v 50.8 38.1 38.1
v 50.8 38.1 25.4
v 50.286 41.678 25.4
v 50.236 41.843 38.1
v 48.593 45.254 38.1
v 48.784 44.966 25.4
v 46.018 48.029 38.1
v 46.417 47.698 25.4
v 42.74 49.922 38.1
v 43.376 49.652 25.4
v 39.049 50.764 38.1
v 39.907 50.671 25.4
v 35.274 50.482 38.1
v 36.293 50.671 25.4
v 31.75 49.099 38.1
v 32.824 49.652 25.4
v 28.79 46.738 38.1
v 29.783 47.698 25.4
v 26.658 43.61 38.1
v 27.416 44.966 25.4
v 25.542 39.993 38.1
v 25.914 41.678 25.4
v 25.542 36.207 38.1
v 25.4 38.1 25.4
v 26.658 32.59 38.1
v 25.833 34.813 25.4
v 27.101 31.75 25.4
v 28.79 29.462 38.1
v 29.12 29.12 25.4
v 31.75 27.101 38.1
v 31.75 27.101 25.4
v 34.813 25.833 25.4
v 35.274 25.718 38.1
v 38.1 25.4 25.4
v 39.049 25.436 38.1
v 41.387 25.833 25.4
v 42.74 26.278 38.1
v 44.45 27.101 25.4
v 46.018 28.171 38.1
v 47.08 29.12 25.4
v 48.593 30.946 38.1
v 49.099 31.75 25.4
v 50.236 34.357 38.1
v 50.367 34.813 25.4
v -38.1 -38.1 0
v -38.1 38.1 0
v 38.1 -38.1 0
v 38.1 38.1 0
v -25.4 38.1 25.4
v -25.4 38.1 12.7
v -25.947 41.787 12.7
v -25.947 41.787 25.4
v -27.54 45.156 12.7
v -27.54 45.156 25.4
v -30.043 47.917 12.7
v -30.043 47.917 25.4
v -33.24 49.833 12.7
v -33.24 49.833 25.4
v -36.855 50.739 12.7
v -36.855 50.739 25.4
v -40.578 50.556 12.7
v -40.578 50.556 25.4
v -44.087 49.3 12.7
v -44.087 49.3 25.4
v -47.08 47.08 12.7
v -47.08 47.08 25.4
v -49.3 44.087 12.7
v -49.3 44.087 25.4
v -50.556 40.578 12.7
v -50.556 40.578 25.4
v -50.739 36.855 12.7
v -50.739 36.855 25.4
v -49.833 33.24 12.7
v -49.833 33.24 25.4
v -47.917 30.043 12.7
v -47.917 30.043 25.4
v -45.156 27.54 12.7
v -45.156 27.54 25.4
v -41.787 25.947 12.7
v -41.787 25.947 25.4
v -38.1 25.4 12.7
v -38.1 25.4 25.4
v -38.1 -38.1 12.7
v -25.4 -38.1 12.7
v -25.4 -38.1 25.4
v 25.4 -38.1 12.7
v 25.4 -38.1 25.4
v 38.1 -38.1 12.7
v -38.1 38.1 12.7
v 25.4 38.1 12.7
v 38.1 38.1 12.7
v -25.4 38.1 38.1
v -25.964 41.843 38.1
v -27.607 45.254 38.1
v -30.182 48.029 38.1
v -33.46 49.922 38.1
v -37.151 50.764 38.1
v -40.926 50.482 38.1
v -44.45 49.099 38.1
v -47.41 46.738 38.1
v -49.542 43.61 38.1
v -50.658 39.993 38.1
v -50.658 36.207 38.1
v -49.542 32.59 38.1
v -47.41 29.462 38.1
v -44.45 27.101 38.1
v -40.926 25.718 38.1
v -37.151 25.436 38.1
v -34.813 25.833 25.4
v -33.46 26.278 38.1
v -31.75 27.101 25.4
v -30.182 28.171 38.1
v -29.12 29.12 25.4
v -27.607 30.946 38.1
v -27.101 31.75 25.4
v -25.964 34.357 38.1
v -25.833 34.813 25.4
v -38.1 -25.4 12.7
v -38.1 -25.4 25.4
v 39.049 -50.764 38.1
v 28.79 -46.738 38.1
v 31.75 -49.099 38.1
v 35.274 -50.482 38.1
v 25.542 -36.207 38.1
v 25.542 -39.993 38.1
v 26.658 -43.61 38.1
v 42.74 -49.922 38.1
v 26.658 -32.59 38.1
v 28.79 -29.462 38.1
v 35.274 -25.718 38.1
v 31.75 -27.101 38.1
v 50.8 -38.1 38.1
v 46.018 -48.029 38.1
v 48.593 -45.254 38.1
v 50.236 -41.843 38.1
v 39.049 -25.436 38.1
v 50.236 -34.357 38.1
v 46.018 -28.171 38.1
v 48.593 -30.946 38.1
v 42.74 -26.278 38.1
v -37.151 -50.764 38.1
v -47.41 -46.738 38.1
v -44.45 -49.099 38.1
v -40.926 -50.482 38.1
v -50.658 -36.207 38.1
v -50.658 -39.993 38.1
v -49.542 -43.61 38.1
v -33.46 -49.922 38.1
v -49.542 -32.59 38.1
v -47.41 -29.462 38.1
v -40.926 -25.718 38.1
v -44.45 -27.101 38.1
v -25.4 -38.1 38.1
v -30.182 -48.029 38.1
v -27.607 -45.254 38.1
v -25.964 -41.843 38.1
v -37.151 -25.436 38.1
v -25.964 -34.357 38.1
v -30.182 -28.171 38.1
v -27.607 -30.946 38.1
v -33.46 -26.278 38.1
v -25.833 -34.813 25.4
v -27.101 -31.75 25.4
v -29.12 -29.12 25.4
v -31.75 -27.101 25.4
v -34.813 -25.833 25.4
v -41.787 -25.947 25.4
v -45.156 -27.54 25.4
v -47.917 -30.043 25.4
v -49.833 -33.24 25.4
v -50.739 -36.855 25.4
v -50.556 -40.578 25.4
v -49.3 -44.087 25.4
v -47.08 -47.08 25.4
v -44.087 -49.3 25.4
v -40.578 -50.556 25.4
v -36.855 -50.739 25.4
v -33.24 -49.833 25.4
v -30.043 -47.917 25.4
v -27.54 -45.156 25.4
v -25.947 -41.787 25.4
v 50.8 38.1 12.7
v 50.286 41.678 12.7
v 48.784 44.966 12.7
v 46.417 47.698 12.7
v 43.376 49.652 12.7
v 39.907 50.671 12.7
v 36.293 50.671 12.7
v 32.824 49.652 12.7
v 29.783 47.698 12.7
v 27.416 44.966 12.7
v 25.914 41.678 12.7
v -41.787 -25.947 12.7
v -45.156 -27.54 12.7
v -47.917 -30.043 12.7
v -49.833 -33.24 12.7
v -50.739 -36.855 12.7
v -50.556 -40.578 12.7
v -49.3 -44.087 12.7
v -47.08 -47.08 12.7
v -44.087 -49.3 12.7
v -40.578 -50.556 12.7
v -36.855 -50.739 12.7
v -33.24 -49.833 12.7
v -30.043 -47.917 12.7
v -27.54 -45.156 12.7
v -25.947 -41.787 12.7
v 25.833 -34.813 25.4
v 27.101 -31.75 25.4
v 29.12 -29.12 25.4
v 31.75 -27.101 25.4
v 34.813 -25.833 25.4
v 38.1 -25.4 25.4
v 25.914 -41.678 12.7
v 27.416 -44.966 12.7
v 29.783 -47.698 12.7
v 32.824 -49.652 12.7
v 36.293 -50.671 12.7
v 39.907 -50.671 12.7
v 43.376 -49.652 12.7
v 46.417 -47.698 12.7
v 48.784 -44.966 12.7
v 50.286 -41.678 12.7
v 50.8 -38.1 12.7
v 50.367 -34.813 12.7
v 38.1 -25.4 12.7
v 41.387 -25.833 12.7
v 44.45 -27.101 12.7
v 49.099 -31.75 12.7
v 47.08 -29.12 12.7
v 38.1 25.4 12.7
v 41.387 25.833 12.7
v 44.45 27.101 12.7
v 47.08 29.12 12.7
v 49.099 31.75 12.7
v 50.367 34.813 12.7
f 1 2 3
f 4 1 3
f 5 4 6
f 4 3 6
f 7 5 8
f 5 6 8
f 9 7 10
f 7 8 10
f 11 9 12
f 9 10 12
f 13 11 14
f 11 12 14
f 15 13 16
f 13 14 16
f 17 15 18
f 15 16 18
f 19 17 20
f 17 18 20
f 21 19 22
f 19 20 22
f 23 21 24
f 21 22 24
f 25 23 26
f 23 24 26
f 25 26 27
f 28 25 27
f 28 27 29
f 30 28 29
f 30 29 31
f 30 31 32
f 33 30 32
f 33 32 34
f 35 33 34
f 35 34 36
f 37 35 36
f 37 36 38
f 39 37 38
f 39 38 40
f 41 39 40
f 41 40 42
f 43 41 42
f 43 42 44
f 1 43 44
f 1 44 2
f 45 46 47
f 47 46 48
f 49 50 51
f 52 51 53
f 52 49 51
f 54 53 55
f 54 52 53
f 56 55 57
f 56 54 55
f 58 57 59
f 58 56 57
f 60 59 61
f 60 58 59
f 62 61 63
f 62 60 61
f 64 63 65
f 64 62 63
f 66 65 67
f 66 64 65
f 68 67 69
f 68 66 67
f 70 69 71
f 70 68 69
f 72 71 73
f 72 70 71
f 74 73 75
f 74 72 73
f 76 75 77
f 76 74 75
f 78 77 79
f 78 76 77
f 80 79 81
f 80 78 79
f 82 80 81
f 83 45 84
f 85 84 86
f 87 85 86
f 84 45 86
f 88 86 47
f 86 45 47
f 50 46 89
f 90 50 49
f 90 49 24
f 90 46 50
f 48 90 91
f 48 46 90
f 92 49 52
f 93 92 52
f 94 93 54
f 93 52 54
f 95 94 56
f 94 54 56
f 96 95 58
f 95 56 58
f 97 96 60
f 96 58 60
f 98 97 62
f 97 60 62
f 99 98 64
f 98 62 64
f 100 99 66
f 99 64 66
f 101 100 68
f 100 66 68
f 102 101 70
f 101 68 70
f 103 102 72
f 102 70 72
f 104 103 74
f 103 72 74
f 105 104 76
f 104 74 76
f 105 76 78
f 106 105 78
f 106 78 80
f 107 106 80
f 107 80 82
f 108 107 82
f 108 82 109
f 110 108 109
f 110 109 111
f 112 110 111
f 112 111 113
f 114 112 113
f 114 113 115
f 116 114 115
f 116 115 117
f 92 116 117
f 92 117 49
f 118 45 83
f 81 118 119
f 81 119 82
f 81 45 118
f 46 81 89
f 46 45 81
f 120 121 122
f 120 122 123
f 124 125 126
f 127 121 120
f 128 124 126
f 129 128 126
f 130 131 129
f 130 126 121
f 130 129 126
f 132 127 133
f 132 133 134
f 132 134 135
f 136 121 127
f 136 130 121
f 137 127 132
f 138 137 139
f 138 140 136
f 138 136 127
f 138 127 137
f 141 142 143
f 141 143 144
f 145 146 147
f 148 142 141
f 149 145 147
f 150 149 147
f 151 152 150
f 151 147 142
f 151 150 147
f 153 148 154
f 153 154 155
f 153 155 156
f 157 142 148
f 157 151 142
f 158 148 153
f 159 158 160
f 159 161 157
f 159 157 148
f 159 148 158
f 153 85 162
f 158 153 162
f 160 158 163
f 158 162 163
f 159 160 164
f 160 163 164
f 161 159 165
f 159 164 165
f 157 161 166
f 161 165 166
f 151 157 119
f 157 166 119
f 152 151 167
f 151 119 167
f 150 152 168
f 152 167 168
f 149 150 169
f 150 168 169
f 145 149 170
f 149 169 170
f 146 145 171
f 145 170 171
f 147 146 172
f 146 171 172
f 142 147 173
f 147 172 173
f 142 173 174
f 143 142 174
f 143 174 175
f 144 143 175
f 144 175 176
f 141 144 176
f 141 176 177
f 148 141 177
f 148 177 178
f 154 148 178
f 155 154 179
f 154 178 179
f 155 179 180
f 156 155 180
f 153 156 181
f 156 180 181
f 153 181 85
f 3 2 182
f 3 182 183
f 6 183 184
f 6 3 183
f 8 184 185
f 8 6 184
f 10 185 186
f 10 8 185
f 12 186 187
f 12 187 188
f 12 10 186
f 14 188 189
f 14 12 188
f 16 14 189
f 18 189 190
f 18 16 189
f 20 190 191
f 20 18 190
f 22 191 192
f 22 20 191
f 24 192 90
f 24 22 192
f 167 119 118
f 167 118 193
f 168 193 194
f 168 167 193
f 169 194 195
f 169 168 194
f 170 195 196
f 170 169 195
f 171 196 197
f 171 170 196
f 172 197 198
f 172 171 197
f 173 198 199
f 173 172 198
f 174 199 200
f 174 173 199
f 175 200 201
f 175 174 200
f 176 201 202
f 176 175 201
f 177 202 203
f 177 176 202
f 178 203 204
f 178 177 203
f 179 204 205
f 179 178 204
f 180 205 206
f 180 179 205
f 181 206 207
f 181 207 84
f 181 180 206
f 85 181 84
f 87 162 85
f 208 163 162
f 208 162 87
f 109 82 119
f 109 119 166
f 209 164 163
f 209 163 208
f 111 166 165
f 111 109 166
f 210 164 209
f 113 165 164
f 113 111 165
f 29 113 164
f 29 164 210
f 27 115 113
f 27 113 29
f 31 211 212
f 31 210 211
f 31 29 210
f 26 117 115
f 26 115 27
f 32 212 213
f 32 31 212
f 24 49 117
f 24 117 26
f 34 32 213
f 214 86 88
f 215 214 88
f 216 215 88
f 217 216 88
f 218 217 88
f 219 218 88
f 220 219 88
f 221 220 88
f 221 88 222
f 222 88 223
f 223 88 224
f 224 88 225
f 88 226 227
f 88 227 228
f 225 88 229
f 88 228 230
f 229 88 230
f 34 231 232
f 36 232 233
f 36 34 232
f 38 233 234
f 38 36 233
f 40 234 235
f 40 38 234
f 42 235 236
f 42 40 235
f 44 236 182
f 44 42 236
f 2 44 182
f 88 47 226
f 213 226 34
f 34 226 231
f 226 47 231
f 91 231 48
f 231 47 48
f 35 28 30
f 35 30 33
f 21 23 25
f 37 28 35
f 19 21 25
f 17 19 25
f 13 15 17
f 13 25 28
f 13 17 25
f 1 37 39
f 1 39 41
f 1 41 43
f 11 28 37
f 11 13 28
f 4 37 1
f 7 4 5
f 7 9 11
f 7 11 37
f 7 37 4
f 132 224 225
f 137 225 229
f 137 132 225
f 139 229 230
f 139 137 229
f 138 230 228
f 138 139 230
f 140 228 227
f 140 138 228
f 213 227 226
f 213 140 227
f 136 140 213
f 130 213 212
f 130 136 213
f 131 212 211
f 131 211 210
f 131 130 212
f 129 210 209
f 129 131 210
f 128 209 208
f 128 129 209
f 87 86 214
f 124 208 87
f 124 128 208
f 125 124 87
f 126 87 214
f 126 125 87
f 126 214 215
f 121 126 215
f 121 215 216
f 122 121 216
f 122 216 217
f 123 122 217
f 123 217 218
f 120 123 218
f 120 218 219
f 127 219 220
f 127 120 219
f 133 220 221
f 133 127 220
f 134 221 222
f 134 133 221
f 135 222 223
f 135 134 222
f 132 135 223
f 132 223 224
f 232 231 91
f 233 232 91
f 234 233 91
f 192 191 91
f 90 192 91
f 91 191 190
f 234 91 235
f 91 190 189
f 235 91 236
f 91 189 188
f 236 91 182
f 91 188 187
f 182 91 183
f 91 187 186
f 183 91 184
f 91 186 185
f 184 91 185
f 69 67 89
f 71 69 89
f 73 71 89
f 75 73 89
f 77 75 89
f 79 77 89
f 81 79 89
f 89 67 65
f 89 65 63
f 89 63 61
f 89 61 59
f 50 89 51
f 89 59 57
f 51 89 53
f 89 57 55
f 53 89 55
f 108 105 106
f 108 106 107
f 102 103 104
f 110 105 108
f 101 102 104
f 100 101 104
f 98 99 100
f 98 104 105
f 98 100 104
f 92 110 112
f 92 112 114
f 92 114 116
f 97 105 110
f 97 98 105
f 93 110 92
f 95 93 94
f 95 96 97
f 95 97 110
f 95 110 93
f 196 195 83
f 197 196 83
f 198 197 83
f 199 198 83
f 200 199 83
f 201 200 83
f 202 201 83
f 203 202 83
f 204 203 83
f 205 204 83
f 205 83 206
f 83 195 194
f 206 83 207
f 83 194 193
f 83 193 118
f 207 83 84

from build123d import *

# Parameters (mm, degrees)
F0_W     = 76.2
F0_H     = 76.2
F1_DEPTH = 25.4
F2_R     = 12.7
F3_DEPTH = 12.7


with BuildPart() as f1:
    # F0 (on Top) → F1 (new body)
    with BuildSketch(Plane.XY):
        Rectangle(F0_W, F0_H)
    extrude(amount=F1_DEPTH)

    # F2 (on face) → F3 (join, symmetric)
    with BuildSketch(Plane.XY.offset(25.4)):
        with Locations((-38.1, 38.1)):
            Circle(F2_R)
        with Locations((38.1, 38.1)):
            Circle(F2_R)
        with Locations((-38.1, -38.1)):
            Circle(F2_R)
        with Locations((38.1, -38.1)):
            Circle(F2_R)
    extrude(amount=F3_DEPTH, both=True)


solid = f1.part
